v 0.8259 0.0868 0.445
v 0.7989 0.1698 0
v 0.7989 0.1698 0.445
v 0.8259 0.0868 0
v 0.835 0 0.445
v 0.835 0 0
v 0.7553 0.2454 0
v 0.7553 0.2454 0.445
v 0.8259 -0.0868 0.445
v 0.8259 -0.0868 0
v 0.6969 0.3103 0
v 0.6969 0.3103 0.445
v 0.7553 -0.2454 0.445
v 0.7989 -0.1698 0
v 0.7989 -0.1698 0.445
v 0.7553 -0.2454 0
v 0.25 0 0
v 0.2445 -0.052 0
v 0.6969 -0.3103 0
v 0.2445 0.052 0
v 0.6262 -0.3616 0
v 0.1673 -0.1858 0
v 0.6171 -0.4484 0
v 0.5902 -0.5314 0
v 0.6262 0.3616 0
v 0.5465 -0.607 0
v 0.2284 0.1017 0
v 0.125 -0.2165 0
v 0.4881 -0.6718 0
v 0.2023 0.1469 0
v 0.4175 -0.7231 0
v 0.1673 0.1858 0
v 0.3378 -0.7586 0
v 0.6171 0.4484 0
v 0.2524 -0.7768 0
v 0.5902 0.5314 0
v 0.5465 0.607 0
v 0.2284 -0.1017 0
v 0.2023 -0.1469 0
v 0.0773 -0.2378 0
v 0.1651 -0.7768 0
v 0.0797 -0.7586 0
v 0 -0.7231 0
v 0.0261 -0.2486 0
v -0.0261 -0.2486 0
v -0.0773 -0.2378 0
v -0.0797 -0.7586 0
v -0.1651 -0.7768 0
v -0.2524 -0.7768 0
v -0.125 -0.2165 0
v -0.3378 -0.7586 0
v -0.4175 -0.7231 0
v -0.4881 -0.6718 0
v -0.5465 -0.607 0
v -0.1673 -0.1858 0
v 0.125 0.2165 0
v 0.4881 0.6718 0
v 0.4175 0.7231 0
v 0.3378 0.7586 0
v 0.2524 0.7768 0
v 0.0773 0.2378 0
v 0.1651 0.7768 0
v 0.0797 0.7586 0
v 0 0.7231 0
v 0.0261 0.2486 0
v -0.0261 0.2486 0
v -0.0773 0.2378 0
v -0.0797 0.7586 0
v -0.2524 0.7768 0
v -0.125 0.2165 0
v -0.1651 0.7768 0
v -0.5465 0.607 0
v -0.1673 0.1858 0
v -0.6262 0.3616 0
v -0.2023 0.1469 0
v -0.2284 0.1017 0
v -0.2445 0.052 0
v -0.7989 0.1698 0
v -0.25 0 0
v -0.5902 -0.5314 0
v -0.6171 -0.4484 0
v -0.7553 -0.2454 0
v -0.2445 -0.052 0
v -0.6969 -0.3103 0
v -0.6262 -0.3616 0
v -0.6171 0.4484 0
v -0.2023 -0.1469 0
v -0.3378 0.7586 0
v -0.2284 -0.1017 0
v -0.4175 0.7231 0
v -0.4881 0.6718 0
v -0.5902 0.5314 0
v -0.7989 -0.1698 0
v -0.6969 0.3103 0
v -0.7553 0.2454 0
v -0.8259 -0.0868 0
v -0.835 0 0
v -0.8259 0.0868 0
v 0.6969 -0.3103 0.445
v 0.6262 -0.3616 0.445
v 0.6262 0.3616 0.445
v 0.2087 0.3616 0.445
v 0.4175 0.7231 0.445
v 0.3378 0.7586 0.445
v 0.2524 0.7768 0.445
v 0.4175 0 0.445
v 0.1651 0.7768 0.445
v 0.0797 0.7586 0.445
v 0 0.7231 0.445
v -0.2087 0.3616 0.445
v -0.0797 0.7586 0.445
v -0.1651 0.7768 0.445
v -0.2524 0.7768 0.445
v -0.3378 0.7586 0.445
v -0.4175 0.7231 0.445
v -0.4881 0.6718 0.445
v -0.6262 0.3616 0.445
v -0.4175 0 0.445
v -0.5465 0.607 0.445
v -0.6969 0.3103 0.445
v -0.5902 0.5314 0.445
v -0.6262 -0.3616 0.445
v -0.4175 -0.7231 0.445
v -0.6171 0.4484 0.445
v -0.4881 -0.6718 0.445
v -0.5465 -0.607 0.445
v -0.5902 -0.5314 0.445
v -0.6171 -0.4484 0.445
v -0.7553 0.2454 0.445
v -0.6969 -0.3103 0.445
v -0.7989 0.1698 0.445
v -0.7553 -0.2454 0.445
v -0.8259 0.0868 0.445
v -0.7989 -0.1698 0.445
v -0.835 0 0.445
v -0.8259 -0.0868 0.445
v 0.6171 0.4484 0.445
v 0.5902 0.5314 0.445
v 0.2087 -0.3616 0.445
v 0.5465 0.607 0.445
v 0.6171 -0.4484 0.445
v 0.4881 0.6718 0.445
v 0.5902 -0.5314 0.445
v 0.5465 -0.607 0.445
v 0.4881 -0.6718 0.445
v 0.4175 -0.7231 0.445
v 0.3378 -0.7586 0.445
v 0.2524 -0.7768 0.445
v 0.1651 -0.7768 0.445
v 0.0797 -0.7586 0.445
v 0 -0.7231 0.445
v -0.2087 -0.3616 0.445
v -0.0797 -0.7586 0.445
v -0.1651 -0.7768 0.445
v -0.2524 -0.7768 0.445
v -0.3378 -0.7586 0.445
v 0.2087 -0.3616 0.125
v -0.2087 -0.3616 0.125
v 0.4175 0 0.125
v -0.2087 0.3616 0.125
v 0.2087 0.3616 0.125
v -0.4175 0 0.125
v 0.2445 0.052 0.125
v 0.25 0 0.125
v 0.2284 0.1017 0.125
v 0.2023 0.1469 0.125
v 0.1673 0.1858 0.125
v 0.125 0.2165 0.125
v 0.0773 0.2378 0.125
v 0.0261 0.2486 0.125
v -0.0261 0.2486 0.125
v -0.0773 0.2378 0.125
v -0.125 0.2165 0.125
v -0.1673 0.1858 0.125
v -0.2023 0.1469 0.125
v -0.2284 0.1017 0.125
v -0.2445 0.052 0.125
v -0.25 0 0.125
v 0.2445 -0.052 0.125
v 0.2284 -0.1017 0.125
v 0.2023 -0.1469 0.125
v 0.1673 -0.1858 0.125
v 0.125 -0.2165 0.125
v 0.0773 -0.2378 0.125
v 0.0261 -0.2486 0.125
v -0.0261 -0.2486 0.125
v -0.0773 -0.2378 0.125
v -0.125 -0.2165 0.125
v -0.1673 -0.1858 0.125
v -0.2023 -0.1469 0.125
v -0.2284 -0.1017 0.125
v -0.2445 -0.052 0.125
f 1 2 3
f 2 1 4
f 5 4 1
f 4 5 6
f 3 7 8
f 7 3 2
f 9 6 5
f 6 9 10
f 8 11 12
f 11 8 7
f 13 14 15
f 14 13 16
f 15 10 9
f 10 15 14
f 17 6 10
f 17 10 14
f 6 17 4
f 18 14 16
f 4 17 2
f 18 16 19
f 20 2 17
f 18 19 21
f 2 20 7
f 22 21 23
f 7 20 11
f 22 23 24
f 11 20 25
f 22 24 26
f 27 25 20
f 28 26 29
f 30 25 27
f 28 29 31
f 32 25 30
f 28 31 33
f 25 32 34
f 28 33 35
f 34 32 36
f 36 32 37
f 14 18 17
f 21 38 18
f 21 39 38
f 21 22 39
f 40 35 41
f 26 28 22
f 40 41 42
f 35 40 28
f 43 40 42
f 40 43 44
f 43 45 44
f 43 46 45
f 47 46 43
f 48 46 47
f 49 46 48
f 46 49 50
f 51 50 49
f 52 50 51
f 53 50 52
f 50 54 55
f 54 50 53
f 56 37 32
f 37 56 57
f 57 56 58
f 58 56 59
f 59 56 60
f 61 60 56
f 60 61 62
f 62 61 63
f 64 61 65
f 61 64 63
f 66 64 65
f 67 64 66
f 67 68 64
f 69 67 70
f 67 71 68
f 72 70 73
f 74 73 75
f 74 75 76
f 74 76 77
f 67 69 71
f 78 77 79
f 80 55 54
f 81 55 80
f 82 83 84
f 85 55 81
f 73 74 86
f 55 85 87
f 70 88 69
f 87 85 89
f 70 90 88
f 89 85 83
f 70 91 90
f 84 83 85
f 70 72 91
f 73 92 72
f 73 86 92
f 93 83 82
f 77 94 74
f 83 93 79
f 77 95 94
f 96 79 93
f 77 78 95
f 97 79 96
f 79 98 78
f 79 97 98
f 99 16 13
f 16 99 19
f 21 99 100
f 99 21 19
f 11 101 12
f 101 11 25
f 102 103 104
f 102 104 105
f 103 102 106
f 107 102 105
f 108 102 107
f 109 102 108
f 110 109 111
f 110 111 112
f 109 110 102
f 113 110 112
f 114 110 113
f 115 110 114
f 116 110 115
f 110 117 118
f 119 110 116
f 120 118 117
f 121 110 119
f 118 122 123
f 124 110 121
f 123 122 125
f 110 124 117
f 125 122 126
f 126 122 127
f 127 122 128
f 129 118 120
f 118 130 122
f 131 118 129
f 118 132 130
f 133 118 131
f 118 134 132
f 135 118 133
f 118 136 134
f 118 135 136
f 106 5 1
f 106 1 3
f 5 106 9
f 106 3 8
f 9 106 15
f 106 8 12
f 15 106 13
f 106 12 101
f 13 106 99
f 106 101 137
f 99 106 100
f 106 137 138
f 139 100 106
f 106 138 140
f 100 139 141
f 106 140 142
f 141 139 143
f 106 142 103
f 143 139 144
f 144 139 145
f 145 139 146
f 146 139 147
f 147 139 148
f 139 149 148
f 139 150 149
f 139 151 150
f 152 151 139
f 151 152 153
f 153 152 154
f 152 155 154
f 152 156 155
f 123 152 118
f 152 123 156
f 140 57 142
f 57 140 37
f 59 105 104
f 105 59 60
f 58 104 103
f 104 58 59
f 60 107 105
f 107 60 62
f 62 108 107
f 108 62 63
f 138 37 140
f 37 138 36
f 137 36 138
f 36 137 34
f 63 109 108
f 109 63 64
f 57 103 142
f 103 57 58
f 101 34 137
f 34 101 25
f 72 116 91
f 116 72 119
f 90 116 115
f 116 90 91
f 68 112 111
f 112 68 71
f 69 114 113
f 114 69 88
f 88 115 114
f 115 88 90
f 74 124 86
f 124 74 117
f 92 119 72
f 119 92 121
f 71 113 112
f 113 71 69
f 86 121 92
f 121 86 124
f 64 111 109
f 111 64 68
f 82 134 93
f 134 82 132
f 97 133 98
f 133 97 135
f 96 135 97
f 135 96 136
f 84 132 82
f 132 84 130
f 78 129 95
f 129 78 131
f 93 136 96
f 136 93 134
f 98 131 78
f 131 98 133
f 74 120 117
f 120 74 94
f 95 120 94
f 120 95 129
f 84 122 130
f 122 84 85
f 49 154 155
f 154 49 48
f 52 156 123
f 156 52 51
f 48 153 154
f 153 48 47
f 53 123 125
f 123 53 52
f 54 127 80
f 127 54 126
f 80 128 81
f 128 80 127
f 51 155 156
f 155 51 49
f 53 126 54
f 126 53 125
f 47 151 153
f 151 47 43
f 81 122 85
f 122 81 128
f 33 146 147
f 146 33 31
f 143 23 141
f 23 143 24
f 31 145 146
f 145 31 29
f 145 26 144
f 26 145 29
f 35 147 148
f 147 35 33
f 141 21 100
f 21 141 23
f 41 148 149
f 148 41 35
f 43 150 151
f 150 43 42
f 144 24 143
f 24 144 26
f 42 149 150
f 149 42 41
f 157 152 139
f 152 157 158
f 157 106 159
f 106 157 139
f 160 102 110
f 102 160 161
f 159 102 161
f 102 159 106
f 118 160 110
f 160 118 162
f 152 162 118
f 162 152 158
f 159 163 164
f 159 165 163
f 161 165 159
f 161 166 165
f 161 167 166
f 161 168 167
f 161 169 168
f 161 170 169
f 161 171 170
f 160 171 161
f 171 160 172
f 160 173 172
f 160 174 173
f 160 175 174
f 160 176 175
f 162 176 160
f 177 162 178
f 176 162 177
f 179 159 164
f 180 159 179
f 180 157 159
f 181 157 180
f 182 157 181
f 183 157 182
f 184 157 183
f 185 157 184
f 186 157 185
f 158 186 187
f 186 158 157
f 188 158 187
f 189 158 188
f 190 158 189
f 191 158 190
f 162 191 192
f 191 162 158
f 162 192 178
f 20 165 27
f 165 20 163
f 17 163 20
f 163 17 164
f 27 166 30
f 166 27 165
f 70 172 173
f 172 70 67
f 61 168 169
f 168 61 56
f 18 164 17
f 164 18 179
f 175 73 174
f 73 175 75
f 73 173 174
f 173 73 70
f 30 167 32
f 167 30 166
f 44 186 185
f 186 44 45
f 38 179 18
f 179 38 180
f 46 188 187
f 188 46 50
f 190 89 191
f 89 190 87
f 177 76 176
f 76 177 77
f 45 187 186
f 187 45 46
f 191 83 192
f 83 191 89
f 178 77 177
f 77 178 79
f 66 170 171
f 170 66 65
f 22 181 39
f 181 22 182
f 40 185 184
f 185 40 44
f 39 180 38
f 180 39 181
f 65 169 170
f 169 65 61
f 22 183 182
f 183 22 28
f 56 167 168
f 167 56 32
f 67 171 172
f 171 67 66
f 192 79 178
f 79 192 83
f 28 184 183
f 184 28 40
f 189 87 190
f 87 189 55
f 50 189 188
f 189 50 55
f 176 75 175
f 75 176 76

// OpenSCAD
hex=.835; //Inscribed diamter of hex head on bolt
dia=.5; //Bolt diameter
height=.32; //Thickness of the hex head
collar=.125; //Amount around the bolt
res=30;

difference(){
    for(i=[0:6]){
        rotate([0,0,i*360/6])
        translate([hex/2.0,0]) cylinder(d=hex, h=height+collar, $fn=res);
    }
    translate([0,0,collar]) cylinder(d=hex, h=height, $fn=6);
    cylinder(d=dia, h=collar, $fn=res);
}
